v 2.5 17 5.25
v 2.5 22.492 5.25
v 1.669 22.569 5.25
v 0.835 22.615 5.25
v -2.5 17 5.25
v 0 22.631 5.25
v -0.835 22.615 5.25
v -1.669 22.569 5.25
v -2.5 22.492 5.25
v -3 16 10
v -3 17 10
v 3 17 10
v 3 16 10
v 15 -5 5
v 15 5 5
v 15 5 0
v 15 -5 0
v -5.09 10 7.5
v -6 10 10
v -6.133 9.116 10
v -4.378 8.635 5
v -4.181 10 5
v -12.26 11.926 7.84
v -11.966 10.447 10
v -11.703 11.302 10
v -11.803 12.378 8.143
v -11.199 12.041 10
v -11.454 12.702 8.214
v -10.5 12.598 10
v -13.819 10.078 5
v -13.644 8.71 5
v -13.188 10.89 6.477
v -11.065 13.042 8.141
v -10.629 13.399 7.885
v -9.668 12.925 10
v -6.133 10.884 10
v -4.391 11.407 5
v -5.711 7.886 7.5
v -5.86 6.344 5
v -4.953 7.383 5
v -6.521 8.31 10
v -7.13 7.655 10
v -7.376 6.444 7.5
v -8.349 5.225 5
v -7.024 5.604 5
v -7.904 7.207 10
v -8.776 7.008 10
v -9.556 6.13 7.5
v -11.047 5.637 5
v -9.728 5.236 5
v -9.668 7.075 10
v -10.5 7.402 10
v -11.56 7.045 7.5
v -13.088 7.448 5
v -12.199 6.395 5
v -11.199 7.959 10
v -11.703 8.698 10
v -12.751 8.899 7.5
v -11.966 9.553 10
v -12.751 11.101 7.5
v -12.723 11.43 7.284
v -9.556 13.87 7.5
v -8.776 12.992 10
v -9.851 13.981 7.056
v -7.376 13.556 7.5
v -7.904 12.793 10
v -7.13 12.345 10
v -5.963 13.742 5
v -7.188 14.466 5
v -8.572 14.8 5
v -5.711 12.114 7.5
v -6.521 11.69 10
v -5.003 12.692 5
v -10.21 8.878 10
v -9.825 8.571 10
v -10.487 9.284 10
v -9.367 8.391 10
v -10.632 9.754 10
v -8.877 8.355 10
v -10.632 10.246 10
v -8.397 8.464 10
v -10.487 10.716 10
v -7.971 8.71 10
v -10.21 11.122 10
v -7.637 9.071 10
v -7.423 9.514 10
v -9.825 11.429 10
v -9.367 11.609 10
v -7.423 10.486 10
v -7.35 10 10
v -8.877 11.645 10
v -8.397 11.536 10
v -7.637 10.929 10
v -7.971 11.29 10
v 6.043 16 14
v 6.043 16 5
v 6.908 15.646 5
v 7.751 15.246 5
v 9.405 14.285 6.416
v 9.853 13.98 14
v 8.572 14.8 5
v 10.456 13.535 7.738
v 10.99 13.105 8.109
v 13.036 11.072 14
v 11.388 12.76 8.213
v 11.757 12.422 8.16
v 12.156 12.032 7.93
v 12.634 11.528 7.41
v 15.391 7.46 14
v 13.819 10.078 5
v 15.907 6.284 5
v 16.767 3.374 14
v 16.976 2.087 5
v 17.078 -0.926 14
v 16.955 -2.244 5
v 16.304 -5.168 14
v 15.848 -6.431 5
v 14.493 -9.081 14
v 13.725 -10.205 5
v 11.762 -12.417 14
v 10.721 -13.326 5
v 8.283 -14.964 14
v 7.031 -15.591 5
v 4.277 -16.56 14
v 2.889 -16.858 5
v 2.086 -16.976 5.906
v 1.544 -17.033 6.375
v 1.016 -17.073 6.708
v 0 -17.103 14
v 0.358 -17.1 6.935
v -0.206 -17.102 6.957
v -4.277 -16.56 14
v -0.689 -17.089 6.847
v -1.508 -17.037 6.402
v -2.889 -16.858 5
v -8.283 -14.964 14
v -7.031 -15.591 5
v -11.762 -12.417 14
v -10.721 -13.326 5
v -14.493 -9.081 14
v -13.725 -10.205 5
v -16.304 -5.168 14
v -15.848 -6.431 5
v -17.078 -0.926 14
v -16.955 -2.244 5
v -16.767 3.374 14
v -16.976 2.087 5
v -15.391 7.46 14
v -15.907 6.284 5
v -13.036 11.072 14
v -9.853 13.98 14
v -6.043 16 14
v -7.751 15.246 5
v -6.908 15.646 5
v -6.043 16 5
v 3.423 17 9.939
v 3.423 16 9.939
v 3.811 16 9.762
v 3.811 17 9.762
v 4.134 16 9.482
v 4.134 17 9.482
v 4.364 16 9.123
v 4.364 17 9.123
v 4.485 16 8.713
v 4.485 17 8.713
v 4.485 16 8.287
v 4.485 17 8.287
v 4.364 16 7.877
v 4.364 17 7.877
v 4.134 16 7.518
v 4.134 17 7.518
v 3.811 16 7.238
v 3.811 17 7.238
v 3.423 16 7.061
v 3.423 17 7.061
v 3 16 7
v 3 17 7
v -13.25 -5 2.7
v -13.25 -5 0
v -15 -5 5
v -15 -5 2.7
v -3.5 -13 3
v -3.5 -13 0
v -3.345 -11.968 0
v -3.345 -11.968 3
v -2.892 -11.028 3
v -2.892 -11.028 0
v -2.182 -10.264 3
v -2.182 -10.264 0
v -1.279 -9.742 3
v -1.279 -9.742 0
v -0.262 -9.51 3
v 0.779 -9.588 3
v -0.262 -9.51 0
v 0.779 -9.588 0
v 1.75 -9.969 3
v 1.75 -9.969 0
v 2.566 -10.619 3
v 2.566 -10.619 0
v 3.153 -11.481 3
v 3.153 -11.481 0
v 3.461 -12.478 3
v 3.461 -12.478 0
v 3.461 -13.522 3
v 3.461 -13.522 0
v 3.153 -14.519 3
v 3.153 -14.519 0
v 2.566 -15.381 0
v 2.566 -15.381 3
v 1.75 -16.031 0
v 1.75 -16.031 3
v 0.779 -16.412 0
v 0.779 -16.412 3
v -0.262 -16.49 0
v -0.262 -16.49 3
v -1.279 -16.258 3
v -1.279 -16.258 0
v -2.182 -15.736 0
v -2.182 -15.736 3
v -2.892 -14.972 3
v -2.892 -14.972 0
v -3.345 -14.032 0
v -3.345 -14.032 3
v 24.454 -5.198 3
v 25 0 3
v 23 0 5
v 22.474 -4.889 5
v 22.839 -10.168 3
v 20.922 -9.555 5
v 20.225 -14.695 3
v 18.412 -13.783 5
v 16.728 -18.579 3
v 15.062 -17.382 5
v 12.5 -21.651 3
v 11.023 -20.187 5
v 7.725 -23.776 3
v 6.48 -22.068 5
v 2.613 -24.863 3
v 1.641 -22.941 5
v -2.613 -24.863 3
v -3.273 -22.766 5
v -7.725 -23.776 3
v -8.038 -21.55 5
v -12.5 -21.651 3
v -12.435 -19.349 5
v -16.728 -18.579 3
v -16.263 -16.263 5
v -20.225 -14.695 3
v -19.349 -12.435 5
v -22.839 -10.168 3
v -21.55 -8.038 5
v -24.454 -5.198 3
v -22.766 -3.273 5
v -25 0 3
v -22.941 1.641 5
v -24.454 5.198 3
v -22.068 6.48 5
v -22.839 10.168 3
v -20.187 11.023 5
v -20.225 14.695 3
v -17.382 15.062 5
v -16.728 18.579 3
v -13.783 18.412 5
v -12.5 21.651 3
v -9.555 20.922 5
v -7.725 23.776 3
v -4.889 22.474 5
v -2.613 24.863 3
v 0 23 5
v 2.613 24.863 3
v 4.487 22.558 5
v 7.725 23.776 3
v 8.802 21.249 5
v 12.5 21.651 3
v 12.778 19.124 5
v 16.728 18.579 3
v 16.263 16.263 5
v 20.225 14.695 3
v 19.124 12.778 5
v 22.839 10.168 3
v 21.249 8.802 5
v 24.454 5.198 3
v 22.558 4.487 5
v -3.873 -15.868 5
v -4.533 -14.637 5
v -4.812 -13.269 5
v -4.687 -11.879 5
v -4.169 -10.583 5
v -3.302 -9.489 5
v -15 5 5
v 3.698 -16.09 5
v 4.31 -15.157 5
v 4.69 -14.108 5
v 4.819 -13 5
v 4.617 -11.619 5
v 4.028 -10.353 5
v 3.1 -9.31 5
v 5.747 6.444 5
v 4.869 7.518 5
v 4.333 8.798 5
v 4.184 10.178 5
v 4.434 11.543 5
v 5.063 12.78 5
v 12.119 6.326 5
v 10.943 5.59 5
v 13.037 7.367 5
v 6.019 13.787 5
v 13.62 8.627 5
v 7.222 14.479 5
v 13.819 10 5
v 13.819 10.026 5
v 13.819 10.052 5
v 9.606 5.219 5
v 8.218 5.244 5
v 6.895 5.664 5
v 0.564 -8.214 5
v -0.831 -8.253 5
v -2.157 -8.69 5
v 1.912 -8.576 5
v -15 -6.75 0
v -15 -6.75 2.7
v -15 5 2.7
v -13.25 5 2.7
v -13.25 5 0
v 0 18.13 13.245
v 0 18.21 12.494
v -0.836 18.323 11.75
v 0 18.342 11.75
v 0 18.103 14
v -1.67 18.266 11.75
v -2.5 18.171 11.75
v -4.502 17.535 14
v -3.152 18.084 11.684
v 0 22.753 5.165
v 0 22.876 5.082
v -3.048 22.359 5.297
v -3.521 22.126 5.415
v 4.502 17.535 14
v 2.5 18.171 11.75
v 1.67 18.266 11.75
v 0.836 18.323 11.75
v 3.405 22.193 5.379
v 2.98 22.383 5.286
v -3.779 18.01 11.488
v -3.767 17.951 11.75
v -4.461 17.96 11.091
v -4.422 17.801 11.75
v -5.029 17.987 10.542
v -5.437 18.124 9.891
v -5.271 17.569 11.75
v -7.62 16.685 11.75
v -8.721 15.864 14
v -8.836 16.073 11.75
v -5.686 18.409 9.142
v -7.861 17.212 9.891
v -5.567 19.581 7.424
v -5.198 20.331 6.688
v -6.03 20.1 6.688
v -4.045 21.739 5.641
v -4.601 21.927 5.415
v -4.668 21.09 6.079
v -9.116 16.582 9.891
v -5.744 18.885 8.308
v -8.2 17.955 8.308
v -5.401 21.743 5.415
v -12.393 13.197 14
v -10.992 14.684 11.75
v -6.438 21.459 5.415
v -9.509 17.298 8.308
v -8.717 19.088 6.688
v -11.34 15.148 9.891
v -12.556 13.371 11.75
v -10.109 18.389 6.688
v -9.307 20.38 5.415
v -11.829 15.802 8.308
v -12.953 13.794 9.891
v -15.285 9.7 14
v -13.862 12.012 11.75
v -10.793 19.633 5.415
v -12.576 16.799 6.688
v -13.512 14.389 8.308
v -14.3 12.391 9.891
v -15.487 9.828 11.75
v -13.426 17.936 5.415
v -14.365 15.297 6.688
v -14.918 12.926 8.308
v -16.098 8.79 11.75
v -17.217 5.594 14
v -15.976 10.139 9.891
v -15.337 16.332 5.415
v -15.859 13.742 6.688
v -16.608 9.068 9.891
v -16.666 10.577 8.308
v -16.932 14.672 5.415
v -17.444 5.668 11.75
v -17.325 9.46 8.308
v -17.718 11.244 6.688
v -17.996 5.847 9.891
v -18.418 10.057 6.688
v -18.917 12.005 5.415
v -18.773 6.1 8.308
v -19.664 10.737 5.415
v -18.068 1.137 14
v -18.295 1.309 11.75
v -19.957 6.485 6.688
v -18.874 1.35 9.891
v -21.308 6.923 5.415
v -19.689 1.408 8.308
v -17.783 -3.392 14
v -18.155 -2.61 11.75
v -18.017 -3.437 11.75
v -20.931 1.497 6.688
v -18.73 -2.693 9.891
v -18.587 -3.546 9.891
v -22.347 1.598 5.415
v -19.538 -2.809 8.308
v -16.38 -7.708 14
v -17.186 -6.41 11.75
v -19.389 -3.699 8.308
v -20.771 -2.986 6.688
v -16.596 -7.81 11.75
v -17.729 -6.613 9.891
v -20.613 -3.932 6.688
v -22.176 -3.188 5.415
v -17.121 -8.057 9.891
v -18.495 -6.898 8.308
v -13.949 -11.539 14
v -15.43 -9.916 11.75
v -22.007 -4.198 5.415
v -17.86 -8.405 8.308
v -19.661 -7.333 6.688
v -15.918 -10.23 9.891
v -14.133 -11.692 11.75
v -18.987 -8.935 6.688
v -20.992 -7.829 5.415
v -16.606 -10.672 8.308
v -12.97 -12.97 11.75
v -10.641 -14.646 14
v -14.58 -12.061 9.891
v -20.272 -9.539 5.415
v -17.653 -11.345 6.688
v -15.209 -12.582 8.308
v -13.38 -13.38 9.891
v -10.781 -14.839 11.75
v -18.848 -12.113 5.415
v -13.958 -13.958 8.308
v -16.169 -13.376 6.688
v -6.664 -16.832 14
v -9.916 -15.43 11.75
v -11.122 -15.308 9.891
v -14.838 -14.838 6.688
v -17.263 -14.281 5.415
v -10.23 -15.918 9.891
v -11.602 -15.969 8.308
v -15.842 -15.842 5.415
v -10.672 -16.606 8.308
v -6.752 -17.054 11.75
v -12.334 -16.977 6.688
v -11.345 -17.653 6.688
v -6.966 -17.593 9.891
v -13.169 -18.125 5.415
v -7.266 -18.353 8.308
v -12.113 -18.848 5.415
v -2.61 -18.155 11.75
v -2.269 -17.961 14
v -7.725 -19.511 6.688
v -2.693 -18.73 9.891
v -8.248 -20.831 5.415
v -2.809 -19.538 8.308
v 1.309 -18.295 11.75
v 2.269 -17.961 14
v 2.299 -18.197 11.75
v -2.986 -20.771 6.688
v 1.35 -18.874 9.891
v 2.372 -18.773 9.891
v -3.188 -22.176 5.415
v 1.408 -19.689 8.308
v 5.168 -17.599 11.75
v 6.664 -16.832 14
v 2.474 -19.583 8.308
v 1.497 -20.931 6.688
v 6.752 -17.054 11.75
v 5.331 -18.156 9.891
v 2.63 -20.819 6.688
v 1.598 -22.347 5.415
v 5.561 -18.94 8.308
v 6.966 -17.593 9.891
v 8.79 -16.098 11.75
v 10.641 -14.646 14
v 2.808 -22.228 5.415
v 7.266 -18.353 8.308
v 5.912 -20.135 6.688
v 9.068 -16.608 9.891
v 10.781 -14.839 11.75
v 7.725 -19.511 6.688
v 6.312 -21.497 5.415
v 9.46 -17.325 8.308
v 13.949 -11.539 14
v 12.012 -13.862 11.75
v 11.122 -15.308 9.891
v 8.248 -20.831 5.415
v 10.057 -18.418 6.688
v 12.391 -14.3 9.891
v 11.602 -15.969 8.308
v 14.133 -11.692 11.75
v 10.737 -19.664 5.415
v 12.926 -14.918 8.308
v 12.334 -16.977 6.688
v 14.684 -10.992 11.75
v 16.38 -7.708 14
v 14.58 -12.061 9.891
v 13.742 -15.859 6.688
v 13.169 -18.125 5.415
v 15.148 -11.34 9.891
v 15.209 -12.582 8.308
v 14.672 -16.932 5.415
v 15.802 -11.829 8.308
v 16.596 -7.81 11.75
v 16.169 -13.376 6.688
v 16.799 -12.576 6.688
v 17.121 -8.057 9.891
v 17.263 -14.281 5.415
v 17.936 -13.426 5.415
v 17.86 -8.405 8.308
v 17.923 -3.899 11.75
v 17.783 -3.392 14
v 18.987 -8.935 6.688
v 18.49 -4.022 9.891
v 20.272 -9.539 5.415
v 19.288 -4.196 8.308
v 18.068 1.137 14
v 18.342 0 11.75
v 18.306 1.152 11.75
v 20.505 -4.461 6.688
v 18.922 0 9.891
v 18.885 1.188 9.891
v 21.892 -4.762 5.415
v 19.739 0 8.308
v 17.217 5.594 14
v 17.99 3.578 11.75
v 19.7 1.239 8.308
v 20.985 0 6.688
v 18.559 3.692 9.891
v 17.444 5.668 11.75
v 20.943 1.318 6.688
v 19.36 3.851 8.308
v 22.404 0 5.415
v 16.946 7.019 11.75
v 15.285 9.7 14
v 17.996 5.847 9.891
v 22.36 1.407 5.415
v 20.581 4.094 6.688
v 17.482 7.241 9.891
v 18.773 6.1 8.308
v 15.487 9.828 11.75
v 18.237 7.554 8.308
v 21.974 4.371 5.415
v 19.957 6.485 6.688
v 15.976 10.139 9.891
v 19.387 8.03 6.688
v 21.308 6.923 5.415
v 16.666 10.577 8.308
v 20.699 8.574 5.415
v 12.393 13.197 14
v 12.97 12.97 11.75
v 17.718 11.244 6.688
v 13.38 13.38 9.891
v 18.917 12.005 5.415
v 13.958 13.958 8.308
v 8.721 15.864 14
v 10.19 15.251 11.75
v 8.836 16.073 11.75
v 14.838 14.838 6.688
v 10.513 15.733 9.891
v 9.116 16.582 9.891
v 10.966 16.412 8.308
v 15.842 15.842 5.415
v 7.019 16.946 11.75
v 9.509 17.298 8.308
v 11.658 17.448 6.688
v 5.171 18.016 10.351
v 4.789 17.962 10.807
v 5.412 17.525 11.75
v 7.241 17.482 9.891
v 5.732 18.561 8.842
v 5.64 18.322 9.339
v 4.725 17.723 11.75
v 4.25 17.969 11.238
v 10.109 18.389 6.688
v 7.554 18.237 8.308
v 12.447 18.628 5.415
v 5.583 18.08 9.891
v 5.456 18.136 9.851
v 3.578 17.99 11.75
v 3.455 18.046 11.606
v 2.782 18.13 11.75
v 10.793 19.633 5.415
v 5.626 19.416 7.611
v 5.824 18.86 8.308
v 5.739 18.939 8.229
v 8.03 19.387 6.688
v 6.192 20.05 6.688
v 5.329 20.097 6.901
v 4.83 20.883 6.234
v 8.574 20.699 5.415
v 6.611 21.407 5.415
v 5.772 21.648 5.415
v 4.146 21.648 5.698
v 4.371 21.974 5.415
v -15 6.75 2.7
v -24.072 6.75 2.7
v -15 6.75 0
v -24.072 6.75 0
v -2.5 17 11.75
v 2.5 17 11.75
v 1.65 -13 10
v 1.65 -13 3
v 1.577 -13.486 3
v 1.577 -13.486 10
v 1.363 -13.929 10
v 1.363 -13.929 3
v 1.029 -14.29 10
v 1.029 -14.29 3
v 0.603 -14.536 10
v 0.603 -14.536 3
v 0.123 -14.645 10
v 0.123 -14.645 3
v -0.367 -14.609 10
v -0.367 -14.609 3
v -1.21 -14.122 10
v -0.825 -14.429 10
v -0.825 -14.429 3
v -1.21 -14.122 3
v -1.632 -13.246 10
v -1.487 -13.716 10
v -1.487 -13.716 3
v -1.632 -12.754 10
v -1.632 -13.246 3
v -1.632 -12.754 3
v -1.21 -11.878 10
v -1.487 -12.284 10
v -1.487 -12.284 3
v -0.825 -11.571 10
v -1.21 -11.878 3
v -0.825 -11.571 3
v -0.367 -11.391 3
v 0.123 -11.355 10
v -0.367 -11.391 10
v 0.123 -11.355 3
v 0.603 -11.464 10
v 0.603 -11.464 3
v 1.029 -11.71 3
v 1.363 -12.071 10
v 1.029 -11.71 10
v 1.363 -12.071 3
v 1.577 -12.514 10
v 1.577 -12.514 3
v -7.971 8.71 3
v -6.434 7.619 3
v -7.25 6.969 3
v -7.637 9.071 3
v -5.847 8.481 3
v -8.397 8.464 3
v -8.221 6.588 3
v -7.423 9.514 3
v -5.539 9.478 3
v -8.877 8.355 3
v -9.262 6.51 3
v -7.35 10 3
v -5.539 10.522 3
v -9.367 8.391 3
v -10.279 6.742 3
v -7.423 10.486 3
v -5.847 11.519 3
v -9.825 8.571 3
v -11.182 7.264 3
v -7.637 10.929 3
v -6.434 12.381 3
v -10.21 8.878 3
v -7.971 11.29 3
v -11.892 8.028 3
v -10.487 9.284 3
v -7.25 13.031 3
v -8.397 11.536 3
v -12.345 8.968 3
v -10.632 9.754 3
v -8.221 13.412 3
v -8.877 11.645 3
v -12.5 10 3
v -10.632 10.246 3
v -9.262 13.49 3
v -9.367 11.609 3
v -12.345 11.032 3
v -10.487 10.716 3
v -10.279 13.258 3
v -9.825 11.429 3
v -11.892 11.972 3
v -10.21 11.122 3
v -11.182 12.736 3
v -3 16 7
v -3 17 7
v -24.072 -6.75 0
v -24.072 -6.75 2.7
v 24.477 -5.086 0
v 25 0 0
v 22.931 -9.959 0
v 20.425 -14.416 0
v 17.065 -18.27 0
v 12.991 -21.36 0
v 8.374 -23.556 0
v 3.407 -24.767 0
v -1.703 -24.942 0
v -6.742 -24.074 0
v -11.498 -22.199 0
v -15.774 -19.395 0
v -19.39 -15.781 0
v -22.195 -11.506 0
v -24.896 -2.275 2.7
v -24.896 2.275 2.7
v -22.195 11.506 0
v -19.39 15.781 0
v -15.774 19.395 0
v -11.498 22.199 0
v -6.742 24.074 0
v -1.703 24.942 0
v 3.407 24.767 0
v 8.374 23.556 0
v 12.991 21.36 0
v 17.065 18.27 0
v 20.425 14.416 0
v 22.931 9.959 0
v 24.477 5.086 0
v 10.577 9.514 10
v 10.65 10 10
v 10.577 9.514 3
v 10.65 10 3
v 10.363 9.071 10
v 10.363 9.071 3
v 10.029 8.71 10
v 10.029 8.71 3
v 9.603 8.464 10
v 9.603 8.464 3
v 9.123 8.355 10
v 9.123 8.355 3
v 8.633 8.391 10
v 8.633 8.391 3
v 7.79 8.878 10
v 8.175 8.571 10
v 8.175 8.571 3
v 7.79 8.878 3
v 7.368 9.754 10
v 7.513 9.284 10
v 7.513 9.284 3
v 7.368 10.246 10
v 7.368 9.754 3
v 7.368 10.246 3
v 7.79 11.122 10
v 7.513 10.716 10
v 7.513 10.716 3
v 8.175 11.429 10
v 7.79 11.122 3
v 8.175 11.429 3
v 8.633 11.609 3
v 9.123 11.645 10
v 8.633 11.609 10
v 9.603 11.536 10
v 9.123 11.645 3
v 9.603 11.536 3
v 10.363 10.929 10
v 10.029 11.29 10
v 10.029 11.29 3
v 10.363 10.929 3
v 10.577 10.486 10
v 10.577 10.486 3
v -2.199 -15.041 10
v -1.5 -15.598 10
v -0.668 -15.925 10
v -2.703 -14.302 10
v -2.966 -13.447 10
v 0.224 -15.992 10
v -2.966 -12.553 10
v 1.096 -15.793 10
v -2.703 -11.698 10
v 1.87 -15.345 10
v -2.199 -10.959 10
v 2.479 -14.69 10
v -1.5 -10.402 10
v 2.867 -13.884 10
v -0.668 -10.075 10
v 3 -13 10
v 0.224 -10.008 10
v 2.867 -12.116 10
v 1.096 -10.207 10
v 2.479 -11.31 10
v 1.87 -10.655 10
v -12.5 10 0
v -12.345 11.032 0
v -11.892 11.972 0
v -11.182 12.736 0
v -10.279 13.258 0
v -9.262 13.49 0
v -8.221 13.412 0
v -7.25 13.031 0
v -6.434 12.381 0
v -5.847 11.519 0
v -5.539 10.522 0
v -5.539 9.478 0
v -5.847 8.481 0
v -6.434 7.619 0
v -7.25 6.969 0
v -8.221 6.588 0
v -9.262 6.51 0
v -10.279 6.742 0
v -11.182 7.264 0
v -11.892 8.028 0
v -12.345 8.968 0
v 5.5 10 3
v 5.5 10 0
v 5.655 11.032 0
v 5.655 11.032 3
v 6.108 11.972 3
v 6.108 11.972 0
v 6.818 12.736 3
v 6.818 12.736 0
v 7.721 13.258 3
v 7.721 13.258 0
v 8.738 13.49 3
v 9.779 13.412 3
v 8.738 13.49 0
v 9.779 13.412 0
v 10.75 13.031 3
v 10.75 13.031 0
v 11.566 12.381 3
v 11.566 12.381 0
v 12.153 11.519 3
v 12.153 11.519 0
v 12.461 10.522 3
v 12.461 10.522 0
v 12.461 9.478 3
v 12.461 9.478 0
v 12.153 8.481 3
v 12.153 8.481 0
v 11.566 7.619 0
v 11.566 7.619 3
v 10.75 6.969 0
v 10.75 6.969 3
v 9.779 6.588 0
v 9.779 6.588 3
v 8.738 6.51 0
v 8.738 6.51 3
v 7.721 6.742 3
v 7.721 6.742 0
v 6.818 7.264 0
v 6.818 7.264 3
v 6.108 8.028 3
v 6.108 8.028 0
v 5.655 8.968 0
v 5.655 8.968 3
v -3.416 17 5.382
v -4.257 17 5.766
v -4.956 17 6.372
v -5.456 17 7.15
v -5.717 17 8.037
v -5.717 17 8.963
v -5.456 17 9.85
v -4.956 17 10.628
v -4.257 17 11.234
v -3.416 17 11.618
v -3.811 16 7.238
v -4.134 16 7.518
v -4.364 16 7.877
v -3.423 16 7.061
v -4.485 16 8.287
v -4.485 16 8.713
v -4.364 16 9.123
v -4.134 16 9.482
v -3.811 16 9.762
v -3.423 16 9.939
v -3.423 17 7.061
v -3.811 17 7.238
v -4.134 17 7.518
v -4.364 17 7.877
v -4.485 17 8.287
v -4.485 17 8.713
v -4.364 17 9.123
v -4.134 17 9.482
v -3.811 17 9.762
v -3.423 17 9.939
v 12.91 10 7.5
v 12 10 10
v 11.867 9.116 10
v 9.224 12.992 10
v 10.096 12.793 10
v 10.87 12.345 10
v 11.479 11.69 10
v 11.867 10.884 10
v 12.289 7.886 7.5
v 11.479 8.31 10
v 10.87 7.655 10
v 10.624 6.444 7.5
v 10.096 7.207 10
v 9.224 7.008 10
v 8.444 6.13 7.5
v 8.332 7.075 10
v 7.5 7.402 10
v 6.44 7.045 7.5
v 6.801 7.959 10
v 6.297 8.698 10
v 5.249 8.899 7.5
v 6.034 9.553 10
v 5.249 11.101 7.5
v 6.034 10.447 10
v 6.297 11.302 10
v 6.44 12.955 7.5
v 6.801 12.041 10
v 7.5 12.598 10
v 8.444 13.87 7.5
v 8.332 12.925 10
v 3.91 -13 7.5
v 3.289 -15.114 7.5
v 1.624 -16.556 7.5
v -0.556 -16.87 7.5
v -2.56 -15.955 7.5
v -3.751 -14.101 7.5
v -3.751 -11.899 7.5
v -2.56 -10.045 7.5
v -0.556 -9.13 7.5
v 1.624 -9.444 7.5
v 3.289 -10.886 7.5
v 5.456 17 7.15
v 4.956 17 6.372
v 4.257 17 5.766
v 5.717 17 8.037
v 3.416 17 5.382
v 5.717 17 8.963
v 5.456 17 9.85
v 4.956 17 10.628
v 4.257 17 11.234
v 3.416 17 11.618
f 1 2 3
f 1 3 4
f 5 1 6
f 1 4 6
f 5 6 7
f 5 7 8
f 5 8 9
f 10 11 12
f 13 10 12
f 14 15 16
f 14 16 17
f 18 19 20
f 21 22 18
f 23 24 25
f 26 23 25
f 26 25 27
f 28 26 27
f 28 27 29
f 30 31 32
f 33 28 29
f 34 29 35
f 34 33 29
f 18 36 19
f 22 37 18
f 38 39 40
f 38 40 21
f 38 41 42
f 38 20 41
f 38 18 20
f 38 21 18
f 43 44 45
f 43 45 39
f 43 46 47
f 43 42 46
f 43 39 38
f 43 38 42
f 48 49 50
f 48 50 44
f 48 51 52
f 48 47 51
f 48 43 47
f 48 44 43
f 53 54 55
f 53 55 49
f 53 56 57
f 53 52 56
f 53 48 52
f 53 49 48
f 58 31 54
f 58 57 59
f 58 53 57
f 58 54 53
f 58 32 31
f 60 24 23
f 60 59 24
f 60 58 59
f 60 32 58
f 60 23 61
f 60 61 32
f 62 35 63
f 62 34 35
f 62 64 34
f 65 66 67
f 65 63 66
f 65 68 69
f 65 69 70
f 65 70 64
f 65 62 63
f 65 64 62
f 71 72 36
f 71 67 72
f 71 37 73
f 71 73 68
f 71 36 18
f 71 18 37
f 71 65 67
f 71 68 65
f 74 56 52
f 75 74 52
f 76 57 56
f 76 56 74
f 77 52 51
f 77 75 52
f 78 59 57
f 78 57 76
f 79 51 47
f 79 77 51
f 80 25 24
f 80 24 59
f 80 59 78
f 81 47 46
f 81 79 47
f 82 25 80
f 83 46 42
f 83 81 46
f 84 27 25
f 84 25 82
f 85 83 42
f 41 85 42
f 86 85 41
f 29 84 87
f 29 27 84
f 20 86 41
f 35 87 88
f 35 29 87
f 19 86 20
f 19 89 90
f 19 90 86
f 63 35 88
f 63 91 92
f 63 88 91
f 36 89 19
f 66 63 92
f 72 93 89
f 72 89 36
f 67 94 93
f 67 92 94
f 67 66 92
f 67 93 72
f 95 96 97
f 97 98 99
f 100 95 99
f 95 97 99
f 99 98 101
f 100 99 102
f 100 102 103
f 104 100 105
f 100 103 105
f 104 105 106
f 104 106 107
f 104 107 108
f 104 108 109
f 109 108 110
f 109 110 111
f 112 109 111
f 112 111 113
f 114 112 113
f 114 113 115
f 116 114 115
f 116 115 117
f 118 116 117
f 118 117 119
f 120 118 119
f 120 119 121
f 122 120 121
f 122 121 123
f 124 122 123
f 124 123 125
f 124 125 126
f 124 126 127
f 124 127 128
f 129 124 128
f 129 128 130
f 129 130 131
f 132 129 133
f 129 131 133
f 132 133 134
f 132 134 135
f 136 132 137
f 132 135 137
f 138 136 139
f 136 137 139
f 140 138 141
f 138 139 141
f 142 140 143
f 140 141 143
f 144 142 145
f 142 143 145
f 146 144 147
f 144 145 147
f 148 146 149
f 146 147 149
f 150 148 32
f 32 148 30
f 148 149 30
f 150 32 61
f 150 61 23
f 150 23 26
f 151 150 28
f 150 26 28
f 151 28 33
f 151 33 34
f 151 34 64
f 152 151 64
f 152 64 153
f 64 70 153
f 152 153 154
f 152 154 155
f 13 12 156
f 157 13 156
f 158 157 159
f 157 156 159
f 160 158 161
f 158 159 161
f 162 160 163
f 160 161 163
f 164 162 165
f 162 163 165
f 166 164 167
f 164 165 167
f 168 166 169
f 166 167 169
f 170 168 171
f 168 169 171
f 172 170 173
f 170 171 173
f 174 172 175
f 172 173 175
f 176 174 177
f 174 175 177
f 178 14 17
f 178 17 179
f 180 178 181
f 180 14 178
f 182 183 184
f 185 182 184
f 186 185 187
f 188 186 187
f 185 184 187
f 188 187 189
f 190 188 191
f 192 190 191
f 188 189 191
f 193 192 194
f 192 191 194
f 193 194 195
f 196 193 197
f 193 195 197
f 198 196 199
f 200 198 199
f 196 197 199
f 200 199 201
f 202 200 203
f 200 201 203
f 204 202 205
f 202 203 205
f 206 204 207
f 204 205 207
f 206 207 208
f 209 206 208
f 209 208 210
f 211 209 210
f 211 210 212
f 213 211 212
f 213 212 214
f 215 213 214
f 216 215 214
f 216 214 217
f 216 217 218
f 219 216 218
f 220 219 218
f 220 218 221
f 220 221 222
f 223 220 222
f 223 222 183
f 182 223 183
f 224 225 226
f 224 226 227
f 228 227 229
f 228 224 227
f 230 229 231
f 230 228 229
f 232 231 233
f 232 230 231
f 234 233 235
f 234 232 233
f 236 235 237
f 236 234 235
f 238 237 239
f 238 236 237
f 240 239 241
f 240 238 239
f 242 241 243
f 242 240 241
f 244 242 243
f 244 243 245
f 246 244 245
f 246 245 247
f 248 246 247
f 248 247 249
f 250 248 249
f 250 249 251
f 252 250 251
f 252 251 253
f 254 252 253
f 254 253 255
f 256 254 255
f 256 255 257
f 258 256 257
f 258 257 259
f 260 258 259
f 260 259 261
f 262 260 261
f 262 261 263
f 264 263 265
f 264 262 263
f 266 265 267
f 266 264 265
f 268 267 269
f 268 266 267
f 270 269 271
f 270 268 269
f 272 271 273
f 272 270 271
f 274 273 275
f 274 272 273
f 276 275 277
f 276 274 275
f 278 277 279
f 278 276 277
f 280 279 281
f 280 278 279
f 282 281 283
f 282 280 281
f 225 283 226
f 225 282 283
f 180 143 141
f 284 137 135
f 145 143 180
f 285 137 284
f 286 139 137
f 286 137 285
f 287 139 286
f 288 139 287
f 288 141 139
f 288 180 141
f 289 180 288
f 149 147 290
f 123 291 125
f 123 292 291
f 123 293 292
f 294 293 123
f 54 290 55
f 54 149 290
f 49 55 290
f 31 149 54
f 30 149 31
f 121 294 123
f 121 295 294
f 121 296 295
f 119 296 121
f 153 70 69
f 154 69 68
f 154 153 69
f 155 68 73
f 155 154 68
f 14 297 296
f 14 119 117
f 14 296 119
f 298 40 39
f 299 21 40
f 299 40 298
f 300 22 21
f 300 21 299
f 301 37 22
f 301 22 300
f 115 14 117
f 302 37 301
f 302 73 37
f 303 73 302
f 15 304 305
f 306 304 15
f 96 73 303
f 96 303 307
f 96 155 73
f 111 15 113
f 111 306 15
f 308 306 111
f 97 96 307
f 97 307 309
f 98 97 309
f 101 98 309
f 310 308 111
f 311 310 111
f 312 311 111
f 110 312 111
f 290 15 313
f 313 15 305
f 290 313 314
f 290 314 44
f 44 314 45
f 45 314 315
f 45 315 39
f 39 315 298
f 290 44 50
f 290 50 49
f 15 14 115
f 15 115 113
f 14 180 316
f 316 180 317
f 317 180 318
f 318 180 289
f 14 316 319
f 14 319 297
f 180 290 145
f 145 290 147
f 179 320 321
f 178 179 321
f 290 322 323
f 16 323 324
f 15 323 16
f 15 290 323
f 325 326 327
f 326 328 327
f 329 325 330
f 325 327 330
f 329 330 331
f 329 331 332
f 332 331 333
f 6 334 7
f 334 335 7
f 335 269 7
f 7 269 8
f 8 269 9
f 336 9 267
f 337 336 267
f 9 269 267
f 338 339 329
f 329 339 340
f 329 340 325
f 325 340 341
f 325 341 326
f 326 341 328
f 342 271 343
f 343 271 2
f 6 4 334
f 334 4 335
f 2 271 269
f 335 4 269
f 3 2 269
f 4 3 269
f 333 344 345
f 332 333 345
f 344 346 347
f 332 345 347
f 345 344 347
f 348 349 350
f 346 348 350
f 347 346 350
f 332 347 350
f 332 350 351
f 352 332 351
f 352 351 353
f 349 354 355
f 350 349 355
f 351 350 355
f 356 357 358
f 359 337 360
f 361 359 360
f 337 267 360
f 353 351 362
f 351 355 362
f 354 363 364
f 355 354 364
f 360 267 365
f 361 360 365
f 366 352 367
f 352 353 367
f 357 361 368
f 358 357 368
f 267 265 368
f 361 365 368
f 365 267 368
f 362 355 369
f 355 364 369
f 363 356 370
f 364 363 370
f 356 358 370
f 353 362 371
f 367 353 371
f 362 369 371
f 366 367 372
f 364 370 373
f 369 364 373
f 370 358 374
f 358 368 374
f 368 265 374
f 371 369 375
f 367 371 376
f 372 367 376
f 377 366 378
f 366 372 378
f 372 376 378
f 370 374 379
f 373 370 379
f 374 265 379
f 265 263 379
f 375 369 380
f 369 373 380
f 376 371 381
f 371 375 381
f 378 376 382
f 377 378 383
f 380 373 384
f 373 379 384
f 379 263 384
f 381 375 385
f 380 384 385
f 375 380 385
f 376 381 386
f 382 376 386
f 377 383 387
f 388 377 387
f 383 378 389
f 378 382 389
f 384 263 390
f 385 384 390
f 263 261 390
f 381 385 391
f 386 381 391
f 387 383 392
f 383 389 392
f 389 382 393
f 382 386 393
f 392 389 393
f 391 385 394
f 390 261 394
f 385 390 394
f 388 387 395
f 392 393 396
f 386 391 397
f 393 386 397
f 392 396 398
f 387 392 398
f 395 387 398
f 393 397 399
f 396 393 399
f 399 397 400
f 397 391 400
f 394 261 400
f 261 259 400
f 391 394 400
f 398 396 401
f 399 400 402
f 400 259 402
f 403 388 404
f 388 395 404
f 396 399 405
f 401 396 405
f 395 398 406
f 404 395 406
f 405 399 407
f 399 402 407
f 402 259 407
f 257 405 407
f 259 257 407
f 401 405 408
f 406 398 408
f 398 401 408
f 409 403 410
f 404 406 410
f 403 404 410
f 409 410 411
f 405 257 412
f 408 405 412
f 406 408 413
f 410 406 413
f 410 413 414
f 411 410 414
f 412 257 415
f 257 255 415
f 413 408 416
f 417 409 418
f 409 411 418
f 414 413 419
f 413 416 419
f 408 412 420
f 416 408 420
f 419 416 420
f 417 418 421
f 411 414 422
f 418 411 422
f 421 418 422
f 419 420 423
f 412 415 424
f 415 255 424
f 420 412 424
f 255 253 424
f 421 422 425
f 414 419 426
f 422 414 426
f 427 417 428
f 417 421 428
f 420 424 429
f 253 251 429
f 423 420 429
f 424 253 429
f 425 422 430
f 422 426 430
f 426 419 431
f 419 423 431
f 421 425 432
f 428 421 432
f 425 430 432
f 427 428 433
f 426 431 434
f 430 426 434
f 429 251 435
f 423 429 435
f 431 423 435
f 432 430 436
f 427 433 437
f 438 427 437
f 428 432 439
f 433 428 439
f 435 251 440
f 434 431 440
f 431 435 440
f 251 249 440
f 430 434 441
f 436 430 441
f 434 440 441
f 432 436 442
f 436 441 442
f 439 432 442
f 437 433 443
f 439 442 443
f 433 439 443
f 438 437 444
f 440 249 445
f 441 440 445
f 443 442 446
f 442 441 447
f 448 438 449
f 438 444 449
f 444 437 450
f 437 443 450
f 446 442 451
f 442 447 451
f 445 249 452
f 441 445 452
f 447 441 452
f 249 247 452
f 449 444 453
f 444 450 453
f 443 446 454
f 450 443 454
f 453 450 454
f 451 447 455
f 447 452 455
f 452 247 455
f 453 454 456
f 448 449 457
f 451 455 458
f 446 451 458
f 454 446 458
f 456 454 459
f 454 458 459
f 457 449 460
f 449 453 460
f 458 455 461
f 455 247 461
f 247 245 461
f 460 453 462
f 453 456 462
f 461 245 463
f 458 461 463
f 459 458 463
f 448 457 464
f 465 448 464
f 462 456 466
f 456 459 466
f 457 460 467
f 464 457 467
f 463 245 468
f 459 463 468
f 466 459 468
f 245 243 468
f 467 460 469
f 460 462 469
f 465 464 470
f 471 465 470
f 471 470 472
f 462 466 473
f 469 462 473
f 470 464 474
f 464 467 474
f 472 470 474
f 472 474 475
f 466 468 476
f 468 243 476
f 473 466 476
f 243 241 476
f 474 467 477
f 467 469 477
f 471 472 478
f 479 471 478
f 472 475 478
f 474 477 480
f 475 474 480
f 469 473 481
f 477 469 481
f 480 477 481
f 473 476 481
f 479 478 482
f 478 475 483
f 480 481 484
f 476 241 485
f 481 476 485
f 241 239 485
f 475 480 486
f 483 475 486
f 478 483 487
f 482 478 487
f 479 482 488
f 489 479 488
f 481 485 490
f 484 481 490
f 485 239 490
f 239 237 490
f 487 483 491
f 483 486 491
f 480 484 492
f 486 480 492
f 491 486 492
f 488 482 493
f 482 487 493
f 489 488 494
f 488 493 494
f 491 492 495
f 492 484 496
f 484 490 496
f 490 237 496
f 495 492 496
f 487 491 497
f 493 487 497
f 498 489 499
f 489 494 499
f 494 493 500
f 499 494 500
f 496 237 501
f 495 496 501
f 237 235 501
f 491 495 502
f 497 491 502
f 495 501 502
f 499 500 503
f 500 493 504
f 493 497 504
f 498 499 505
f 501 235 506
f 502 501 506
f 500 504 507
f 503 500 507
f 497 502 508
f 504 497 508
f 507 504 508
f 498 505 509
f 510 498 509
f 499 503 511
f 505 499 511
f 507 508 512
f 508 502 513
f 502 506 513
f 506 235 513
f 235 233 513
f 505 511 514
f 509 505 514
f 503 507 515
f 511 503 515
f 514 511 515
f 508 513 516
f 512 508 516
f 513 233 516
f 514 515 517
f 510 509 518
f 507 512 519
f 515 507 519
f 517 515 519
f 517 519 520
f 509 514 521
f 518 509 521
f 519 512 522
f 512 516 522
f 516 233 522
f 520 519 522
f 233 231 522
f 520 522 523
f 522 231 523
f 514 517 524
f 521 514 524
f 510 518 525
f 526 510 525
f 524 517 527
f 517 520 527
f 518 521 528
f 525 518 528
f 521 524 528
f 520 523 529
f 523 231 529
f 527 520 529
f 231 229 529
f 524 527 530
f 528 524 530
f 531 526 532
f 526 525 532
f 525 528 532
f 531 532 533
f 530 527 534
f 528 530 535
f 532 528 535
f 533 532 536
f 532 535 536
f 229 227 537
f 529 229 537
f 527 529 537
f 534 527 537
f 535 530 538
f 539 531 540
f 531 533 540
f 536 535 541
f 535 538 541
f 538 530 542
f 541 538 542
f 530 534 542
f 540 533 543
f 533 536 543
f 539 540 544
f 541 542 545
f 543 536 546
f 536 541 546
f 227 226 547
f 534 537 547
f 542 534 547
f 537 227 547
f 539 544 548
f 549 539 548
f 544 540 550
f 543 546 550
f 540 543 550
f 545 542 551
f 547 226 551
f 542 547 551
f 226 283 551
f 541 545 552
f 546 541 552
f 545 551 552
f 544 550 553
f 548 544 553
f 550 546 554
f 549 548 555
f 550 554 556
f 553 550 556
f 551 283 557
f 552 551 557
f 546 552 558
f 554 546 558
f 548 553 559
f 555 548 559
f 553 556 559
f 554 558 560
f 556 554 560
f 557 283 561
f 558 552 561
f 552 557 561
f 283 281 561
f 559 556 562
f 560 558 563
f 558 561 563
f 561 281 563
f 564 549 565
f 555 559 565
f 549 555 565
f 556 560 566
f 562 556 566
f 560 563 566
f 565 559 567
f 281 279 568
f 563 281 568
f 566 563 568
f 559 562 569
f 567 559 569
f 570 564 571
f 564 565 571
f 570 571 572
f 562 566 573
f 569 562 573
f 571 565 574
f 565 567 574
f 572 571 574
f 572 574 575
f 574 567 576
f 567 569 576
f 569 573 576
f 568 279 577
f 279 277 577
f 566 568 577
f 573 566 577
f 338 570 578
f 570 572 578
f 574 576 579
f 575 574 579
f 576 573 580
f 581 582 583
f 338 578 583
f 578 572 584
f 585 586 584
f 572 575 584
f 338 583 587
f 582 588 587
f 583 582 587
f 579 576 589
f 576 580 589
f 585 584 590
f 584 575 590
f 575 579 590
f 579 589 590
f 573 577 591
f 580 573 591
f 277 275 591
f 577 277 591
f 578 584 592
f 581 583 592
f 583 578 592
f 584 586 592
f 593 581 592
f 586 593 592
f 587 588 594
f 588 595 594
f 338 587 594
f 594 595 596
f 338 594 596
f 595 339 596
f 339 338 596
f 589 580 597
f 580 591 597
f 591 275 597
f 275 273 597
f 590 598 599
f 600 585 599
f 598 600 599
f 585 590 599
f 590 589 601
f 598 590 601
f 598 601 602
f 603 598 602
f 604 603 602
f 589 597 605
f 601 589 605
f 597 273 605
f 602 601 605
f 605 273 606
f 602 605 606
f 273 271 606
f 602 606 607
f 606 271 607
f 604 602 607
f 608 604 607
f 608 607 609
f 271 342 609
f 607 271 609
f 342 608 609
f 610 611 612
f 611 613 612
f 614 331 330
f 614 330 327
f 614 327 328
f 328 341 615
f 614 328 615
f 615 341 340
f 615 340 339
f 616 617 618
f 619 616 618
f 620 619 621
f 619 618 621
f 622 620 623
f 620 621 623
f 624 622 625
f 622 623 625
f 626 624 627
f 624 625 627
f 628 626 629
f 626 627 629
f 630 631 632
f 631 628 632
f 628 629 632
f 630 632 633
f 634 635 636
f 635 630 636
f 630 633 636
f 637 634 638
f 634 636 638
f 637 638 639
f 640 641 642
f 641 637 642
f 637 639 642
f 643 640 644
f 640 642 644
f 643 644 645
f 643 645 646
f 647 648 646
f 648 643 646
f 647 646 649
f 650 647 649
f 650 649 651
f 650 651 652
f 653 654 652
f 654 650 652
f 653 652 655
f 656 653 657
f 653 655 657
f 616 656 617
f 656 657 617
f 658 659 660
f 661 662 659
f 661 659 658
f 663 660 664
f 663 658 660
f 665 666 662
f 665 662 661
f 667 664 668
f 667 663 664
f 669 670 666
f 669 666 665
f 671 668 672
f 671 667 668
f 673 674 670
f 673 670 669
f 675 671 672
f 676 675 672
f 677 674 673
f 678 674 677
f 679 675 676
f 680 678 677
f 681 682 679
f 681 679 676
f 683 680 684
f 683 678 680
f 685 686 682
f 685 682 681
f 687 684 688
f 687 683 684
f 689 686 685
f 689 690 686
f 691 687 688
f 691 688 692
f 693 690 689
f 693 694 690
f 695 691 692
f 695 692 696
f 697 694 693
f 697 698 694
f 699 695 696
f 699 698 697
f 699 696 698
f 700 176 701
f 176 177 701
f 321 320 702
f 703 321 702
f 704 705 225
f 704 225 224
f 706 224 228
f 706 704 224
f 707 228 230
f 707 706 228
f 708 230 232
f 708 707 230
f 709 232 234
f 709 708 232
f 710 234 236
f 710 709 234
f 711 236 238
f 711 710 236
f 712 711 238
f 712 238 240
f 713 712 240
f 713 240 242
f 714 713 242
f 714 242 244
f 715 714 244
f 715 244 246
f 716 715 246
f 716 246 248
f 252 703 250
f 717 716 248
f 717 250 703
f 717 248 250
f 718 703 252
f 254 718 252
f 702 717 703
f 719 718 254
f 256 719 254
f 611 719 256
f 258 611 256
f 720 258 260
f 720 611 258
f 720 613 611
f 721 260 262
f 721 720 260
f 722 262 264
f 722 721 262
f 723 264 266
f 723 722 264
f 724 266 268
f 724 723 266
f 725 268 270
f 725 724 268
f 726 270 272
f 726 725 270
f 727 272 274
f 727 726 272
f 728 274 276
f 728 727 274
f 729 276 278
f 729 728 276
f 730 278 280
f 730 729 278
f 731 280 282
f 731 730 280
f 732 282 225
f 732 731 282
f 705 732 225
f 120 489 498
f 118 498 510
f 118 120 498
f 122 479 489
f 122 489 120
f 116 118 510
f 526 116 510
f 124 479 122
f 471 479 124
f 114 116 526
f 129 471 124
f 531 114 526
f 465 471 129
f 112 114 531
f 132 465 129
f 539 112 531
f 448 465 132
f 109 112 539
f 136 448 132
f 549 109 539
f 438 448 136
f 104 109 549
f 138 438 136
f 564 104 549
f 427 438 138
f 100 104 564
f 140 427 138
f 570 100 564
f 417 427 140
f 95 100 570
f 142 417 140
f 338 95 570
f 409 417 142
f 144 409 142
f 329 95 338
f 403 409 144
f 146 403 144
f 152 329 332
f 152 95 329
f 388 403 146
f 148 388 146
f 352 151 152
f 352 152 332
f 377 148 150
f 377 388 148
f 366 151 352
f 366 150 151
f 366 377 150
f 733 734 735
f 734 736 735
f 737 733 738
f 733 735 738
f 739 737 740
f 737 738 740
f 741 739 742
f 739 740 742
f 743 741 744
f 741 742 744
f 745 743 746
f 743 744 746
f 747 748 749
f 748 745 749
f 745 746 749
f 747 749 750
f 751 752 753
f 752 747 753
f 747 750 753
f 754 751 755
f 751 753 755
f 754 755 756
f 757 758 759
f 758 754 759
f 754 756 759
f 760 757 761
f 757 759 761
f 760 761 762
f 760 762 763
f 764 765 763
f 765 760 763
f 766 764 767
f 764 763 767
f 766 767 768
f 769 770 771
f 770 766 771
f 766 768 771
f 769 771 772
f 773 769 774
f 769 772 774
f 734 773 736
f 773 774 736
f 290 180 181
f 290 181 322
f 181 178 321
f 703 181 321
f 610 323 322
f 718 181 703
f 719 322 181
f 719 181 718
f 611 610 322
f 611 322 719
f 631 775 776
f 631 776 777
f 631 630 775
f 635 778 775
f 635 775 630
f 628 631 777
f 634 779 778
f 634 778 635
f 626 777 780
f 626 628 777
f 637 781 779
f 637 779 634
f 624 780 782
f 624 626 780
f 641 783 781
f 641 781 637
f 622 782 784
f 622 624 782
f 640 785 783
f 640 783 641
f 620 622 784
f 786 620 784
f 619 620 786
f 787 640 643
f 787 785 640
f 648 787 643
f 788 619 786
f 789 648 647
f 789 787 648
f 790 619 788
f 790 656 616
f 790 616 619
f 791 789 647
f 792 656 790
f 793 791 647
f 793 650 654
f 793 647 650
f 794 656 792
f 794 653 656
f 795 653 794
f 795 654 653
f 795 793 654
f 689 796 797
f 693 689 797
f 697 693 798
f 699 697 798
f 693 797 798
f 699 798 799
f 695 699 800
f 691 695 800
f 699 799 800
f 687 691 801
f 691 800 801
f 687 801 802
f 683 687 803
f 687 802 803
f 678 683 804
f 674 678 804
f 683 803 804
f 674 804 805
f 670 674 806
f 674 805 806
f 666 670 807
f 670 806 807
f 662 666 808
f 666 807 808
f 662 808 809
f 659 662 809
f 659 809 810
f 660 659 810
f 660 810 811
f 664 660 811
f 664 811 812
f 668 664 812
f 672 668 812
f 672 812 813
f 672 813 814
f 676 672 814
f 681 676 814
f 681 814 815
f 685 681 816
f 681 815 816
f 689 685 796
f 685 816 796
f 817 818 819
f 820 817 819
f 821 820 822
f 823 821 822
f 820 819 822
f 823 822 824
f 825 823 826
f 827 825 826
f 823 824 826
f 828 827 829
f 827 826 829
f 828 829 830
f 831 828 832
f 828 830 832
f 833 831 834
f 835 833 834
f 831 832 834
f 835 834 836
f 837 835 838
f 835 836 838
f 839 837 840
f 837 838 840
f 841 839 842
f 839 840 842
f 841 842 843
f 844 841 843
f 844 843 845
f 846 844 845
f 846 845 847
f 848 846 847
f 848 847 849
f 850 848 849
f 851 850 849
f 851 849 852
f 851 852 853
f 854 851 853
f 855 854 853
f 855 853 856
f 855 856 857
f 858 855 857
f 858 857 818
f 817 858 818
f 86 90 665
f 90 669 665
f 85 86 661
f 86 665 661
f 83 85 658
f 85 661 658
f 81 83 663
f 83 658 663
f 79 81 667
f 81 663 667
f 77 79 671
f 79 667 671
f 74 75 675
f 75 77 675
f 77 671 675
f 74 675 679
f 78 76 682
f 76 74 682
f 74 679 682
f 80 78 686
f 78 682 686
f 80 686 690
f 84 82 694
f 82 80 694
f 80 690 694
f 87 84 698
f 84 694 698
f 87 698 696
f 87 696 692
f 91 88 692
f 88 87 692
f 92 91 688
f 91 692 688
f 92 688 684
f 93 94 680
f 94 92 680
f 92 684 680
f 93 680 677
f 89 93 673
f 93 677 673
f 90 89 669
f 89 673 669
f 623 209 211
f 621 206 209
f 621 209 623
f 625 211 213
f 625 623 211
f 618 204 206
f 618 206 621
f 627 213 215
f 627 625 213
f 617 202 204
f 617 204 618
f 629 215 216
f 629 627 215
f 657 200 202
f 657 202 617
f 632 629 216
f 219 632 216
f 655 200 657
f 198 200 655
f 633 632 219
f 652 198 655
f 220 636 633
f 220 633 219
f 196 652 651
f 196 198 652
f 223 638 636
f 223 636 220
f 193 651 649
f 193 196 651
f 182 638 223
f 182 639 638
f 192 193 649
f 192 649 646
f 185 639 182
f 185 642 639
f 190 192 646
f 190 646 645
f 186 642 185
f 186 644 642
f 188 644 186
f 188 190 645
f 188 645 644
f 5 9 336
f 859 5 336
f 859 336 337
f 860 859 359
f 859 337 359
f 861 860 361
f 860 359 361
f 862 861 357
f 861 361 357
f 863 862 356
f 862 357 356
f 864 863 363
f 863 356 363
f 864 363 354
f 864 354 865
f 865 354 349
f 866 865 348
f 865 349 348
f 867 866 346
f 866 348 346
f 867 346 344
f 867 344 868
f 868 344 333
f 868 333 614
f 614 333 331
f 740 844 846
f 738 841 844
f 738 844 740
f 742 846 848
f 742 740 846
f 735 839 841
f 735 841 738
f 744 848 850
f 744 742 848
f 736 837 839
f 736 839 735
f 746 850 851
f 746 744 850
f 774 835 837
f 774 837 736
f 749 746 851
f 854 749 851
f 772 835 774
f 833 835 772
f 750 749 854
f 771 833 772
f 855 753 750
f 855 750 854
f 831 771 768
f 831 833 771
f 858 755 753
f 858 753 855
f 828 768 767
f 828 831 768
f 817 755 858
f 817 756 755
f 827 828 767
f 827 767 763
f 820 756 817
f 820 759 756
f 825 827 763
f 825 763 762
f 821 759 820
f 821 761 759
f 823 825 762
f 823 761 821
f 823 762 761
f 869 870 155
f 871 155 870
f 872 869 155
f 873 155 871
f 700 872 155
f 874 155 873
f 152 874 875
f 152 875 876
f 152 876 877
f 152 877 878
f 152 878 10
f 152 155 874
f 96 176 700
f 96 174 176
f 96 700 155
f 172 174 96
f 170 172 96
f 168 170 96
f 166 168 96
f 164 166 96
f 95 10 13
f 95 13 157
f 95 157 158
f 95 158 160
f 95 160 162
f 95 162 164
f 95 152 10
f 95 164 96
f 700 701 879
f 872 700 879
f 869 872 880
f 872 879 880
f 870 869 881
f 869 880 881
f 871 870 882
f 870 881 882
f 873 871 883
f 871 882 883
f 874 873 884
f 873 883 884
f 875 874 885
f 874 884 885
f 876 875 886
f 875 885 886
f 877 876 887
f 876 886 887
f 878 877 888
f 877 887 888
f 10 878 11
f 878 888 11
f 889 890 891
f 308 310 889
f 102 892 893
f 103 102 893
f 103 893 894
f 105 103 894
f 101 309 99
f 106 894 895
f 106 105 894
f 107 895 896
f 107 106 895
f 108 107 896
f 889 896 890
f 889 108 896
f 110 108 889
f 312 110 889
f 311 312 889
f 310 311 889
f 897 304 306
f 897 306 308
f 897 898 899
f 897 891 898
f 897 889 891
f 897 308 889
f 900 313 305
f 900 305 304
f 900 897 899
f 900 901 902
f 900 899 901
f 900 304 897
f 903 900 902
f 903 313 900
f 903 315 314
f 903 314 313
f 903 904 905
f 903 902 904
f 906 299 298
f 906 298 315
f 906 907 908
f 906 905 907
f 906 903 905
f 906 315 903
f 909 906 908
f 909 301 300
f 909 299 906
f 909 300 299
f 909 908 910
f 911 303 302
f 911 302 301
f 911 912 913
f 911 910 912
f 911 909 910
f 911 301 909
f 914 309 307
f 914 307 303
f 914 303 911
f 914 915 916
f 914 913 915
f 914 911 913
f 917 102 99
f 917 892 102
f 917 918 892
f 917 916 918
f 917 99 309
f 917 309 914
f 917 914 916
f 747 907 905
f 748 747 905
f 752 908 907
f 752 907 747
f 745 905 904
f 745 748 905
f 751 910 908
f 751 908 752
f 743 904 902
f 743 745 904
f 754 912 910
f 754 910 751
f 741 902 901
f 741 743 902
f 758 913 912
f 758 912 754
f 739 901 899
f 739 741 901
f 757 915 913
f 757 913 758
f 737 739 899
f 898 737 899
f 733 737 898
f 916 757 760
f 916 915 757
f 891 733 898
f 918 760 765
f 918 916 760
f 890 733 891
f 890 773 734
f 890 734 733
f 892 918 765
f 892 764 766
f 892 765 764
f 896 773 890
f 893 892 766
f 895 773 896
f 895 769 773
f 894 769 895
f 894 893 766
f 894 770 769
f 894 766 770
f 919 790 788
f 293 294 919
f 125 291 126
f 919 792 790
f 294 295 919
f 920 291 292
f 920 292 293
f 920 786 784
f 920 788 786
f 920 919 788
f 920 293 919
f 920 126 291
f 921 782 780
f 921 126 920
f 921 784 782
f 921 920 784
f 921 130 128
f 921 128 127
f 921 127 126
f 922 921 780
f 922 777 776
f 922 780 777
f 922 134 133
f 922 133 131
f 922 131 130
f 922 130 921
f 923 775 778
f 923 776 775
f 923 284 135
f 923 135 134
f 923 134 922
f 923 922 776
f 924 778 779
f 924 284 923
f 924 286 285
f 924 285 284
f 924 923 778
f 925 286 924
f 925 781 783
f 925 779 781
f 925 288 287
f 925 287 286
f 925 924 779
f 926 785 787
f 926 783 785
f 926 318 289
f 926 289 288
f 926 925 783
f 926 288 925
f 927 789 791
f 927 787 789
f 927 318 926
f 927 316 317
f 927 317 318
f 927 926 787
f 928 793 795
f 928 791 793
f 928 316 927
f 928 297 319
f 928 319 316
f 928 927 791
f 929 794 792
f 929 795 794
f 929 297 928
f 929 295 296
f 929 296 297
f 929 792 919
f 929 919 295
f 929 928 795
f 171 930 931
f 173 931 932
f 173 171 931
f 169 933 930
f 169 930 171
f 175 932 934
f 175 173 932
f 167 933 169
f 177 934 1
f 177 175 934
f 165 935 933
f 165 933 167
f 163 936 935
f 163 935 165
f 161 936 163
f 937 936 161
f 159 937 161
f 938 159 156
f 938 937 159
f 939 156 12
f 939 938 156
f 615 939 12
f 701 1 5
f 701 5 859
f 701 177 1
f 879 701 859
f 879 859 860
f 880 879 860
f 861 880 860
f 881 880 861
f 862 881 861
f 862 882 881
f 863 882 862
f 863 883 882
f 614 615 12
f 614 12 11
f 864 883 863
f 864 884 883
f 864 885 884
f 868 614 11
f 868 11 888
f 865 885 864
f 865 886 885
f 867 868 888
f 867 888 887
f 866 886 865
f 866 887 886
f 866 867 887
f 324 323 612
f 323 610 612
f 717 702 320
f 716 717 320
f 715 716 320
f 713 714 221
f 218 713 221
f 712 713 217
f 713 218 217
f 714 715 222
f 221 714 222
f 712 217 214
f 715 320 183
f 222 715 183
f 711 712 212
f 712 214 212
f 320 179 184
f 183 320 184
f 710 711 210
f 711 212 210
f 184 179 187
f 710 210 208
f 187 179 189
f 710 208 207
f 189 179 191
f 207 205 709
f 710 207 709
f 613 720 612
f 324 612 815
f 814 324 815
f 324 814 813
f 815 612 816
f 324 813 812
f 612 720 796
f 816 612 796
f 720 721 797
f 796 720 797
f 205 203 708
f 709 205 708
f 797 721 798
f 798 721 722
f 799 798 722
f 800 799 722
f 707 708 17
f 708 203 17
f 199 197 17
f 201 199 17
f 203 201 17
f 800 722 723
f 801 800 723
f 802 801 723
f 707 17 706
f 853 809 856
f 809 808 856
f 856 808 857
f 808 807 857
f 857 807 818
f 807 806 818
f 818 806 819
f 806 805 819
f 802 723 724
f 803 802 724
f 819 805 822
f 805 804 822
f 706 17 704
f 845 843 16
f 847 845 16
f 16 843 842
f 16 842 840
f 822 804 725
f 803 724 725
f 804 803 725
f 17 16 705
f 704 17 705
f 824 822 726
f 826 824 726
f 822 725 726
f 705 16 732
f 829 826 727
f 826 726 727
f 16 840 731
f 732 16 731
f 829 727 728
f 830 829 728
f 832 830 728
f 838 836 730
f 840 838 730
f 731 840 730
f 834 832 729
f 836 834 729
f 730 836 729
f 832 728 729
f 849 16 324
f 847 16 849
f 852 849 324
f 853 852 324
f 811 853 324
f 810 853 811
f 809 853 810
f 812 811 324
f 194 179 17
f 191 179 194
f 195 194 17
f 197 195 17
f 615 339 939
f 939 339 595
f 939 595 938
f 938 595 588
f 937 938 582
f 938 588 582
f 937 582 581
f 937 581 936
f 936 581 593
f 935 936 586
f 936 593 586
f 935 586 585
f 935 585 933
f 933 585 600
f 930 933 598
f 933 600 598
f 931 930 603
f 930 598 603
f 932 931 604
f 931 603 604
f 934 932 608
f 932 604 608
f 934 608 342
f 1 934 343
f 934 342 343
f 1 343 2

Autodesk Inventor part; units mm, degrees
ref_plane "YZ Plane" through (0, 0, 0) normal (1, 0, 0) x (0, 1, 0)
ref_plane "XY Plane" through (0, 0, 0) normal (0, 0, 1) x (1, 0, 0)
sketch "Sketch1" plane through (0, 0, 0) normal (0, 0, 1) x (1, 0, 0)
  circle A0 centre (0, 0) radius 25
  circle A1 centre (0, -13) radius 1.65
  circle A2 centre (-9, 10) radius 1.65
  circle A3 centre (9, 10) radius 1.65
  circle A4 centre (-9, 10) radius 3
  circle A5 centre (9, 10) radius 3
  circle A6 centre (0, -13) radius 3
  dimension "d0" = 50
  dimension "d1" = 13
  dimension "d2" = 10
  dimension "d3" = 9
  dimension "d4" = 9
  dimension "d5" = 3.3
  dimension "d6" = 6
extrude "Extrusion1" add sketch "Sketch1" along normal blind 5 contours A0
extrude "Extrusion2" add sketch "Sketch1" along normal blind 10 contours A4 | A5 | A6
sketch "Sketch2" plane through (0, 0, 0) normal (0, 0, -1) x (-1, 0, 0)
  circle A0 centre (0, -13) radius 1.65 projected
  circle A1 centre (-9, 10) radius 1.65 projected
  circle A2 centre (9, 10) radius 1.65 projected
  circle A3 centre (0, 0) radius 25 projected
  circle A4 centre (-9, 10) radius 3.5
  circle A5 centre (9, 10) radius 3.5
  circle A6 centre (0, -13) radius 3.5
  dimension "d11" = 7
extrude "Extrusion3" cut sketch "Sketch2" against normal blind 3 contours A4 | A5 | A6
chamfer "Chamfer1" distance 1.8199 angle 70 3 edges at (-3, -13, 5) (-12, 10, 5) (6, 10, 5) measured on face at (12.0972, -3.5223, 5)
chamfer "Chamfer2" distance 2 angle 45 1 edges at (-25, 0, 5)
sketch "Sketch3" plane through (0, 0, 0) normal (1, 0, 0) x (0, 1, 0)
  line L0 (14.8199, 5) -> (5.1801, 5) projected
  line L1 (-8.1801, 5) -> (-17.8199, 5) projected
  line L2 (14.8199, 5) -> (5.1801, 5) projected
  line L3 (-23, 5) -> (23, 5) projected
  line L4 (25, 0) -> (25, 3) projected
  line L5 (25, 3) -> (-25, 3) projected
  line L6 (-23, 5) -> (23, 5) projected
  line L7 (25, 3) -> (23, 5) projected
  arc A0 (18.1033, 14) -> (23, 5) centre (28.8225, 14) ccw
  line L8 (18.1033, 14) -> (17.1033, 14)
  line L9 (17.1033, 14) -> (17.1033, 5)
  line L10 (0, -3.8) -> (0, 22.8) projected
  point P0 (0, 0)
  dimension "d20" = 9
  dimension "d21" = 18.1033
  dimension "d22" = 1
revolve "Revolution1" add sketch "Sketch3" angle 360 about axis through (0, 0, -10) along (0, 0, 1) contours L9 L8 A0 L3
sketch "Sketch5" plane through (0, 0, 14) normal (0, 0, 1) x (1, 0, 0)
  line L0 (4, 17.5) -> (-4, 17.5)
  line L1 (-4, 17.5) -> (-7, 16)
  line L2 (-7, 16) -> (7, 16)
  line L3 (7, 16) -> (4, 17.5)
  point P0 (0, 0)
  point P1 (0, 16)
  point P2 (0, 17.5)
  dimension "d37" = 16
  dimension "d39" = 14
  dimension "d42" = 8
  dimension "d43" = 1.5
extrude "Extrusion6" add sketch "Sketch5" against normal up to surface (9 mm away)
ref_plane "Work Plane1" through (0, 25, 0) normal (0, 1, 0) x (-1, 0, 0)
sketch "Sketch4" plane through (0, 25, 0) normal (0, 1, 0) x (-1, 0, 0)
  line L0 (-8.5709, 5) -> (-6.0434, 5) projected
  line L1 (13.8192, 5) -> (8.5709, 5) projected
  line L2 (13.8192, 5) -> (2.8899, 5) projected
  line L3 (-2.8899, 5) -> (2.8899, 5) projected
  line L4 (-2.8899, 5) -> (-13.8192, 5) projected
  line L5 (-8.5709, 5) -> (-13.8192, 5) projected
  line L6 (-2.5, 8.5) -> (2.5, 8.5) construction
  line L7 (3.5, 3) -> (-3.5, 3) projected
  line L8 (-2.5, 5.25) -> (2.5, 5.25)
  line L9 (2.5, 11.75) -> (-2.5, 11.75)
  arc A0 (-2.5, 11.75) -> (-2.5, 5.25) centre (-2.5, 8.5) ccw
  arc A1 (2.5, 5.25) -> (2.5, 11.75) centre (2.5, 8.5) ccw
  line L10 (-3, 8.5) -> (3, 8.5) construction
  line L11 (-3, 7) -> (3, 7)
  line L12 (3, 10) -> (-3, 10)
  arc A2 (-3, 10) -> (-3, 7) centre (-3, 8.5) ccw
  arc A3 (3, 7) -> (3, 10) centre (3, 8.5) ccw
  line L13 (-6.0434, 5) -> (6.0434, 5) projected
  line L14 (6.0434, 5) -> (8.5709, 5) projected
  point P0 (0, 0)
  point P1 (0, 5)
  point P2 (0, 8.5)
  point P3 (0, 5)
  point P4 (0, 8.5)
  dimension "d30" = 6.5
  dimension "d31" = 11.5
  dimension "d32" = 3.5
  dimension "d33" = 3
  dimension "d34" = 9
extrude "Extrusion4" cut sketch "Sketch4" against normal blind 10 contours A2 L12 A3 L11
extrude "Extrusion5" cut sketch "Sketch4" against normal blind 8
sketch "Sketch7" plane through (0, 0, 5) normal (0, 0, 1) x (1, 0, 0)
  line L0 (-15, 5) -> (15, 5)
  line L1 (15, 5) -> (15, -5)
  line L2 (15, -5) -> (-15, -5)
  line L3 (-15, -5) -> (-15, 5)
  point P0 (0, 0)
  point P1 (0, 5)
  point P2 (-15, 0)
  dimension "d50" = 30
  dimension "d51" = 10
extrude "Extrusion8" cut sketch "Sketch7" against normal through all
sketch "Sketch8" plane through (0, 0, 0) normal (0, 0, -1) x (-1, 0, 0)
  line L0 (27, 6.75) -> (15, 6.75)
  line L1 (15, 6.75) -> (15, -6.75)
  line L2 (15, -6.75) -> (27, -6.75)
  line L3 (27, -6.75) -> (27, 6.75)
  point P0 (0, 0)
  point P1 (15, 5)
  point P2 (15, 0)
  dimension "d54" = 13.5
  dimension "d55" = 12
extrude "Extrusion9" cut sketch "Sketch8" against normal blind 2.7
chamfer "Chamfer3" distance 1.75 angle 45 2 edges at (-15, 5, 1.35) (-15, -5, 1.35)
equation "\"d4\" = d3"
properties part number "Baseplate"
